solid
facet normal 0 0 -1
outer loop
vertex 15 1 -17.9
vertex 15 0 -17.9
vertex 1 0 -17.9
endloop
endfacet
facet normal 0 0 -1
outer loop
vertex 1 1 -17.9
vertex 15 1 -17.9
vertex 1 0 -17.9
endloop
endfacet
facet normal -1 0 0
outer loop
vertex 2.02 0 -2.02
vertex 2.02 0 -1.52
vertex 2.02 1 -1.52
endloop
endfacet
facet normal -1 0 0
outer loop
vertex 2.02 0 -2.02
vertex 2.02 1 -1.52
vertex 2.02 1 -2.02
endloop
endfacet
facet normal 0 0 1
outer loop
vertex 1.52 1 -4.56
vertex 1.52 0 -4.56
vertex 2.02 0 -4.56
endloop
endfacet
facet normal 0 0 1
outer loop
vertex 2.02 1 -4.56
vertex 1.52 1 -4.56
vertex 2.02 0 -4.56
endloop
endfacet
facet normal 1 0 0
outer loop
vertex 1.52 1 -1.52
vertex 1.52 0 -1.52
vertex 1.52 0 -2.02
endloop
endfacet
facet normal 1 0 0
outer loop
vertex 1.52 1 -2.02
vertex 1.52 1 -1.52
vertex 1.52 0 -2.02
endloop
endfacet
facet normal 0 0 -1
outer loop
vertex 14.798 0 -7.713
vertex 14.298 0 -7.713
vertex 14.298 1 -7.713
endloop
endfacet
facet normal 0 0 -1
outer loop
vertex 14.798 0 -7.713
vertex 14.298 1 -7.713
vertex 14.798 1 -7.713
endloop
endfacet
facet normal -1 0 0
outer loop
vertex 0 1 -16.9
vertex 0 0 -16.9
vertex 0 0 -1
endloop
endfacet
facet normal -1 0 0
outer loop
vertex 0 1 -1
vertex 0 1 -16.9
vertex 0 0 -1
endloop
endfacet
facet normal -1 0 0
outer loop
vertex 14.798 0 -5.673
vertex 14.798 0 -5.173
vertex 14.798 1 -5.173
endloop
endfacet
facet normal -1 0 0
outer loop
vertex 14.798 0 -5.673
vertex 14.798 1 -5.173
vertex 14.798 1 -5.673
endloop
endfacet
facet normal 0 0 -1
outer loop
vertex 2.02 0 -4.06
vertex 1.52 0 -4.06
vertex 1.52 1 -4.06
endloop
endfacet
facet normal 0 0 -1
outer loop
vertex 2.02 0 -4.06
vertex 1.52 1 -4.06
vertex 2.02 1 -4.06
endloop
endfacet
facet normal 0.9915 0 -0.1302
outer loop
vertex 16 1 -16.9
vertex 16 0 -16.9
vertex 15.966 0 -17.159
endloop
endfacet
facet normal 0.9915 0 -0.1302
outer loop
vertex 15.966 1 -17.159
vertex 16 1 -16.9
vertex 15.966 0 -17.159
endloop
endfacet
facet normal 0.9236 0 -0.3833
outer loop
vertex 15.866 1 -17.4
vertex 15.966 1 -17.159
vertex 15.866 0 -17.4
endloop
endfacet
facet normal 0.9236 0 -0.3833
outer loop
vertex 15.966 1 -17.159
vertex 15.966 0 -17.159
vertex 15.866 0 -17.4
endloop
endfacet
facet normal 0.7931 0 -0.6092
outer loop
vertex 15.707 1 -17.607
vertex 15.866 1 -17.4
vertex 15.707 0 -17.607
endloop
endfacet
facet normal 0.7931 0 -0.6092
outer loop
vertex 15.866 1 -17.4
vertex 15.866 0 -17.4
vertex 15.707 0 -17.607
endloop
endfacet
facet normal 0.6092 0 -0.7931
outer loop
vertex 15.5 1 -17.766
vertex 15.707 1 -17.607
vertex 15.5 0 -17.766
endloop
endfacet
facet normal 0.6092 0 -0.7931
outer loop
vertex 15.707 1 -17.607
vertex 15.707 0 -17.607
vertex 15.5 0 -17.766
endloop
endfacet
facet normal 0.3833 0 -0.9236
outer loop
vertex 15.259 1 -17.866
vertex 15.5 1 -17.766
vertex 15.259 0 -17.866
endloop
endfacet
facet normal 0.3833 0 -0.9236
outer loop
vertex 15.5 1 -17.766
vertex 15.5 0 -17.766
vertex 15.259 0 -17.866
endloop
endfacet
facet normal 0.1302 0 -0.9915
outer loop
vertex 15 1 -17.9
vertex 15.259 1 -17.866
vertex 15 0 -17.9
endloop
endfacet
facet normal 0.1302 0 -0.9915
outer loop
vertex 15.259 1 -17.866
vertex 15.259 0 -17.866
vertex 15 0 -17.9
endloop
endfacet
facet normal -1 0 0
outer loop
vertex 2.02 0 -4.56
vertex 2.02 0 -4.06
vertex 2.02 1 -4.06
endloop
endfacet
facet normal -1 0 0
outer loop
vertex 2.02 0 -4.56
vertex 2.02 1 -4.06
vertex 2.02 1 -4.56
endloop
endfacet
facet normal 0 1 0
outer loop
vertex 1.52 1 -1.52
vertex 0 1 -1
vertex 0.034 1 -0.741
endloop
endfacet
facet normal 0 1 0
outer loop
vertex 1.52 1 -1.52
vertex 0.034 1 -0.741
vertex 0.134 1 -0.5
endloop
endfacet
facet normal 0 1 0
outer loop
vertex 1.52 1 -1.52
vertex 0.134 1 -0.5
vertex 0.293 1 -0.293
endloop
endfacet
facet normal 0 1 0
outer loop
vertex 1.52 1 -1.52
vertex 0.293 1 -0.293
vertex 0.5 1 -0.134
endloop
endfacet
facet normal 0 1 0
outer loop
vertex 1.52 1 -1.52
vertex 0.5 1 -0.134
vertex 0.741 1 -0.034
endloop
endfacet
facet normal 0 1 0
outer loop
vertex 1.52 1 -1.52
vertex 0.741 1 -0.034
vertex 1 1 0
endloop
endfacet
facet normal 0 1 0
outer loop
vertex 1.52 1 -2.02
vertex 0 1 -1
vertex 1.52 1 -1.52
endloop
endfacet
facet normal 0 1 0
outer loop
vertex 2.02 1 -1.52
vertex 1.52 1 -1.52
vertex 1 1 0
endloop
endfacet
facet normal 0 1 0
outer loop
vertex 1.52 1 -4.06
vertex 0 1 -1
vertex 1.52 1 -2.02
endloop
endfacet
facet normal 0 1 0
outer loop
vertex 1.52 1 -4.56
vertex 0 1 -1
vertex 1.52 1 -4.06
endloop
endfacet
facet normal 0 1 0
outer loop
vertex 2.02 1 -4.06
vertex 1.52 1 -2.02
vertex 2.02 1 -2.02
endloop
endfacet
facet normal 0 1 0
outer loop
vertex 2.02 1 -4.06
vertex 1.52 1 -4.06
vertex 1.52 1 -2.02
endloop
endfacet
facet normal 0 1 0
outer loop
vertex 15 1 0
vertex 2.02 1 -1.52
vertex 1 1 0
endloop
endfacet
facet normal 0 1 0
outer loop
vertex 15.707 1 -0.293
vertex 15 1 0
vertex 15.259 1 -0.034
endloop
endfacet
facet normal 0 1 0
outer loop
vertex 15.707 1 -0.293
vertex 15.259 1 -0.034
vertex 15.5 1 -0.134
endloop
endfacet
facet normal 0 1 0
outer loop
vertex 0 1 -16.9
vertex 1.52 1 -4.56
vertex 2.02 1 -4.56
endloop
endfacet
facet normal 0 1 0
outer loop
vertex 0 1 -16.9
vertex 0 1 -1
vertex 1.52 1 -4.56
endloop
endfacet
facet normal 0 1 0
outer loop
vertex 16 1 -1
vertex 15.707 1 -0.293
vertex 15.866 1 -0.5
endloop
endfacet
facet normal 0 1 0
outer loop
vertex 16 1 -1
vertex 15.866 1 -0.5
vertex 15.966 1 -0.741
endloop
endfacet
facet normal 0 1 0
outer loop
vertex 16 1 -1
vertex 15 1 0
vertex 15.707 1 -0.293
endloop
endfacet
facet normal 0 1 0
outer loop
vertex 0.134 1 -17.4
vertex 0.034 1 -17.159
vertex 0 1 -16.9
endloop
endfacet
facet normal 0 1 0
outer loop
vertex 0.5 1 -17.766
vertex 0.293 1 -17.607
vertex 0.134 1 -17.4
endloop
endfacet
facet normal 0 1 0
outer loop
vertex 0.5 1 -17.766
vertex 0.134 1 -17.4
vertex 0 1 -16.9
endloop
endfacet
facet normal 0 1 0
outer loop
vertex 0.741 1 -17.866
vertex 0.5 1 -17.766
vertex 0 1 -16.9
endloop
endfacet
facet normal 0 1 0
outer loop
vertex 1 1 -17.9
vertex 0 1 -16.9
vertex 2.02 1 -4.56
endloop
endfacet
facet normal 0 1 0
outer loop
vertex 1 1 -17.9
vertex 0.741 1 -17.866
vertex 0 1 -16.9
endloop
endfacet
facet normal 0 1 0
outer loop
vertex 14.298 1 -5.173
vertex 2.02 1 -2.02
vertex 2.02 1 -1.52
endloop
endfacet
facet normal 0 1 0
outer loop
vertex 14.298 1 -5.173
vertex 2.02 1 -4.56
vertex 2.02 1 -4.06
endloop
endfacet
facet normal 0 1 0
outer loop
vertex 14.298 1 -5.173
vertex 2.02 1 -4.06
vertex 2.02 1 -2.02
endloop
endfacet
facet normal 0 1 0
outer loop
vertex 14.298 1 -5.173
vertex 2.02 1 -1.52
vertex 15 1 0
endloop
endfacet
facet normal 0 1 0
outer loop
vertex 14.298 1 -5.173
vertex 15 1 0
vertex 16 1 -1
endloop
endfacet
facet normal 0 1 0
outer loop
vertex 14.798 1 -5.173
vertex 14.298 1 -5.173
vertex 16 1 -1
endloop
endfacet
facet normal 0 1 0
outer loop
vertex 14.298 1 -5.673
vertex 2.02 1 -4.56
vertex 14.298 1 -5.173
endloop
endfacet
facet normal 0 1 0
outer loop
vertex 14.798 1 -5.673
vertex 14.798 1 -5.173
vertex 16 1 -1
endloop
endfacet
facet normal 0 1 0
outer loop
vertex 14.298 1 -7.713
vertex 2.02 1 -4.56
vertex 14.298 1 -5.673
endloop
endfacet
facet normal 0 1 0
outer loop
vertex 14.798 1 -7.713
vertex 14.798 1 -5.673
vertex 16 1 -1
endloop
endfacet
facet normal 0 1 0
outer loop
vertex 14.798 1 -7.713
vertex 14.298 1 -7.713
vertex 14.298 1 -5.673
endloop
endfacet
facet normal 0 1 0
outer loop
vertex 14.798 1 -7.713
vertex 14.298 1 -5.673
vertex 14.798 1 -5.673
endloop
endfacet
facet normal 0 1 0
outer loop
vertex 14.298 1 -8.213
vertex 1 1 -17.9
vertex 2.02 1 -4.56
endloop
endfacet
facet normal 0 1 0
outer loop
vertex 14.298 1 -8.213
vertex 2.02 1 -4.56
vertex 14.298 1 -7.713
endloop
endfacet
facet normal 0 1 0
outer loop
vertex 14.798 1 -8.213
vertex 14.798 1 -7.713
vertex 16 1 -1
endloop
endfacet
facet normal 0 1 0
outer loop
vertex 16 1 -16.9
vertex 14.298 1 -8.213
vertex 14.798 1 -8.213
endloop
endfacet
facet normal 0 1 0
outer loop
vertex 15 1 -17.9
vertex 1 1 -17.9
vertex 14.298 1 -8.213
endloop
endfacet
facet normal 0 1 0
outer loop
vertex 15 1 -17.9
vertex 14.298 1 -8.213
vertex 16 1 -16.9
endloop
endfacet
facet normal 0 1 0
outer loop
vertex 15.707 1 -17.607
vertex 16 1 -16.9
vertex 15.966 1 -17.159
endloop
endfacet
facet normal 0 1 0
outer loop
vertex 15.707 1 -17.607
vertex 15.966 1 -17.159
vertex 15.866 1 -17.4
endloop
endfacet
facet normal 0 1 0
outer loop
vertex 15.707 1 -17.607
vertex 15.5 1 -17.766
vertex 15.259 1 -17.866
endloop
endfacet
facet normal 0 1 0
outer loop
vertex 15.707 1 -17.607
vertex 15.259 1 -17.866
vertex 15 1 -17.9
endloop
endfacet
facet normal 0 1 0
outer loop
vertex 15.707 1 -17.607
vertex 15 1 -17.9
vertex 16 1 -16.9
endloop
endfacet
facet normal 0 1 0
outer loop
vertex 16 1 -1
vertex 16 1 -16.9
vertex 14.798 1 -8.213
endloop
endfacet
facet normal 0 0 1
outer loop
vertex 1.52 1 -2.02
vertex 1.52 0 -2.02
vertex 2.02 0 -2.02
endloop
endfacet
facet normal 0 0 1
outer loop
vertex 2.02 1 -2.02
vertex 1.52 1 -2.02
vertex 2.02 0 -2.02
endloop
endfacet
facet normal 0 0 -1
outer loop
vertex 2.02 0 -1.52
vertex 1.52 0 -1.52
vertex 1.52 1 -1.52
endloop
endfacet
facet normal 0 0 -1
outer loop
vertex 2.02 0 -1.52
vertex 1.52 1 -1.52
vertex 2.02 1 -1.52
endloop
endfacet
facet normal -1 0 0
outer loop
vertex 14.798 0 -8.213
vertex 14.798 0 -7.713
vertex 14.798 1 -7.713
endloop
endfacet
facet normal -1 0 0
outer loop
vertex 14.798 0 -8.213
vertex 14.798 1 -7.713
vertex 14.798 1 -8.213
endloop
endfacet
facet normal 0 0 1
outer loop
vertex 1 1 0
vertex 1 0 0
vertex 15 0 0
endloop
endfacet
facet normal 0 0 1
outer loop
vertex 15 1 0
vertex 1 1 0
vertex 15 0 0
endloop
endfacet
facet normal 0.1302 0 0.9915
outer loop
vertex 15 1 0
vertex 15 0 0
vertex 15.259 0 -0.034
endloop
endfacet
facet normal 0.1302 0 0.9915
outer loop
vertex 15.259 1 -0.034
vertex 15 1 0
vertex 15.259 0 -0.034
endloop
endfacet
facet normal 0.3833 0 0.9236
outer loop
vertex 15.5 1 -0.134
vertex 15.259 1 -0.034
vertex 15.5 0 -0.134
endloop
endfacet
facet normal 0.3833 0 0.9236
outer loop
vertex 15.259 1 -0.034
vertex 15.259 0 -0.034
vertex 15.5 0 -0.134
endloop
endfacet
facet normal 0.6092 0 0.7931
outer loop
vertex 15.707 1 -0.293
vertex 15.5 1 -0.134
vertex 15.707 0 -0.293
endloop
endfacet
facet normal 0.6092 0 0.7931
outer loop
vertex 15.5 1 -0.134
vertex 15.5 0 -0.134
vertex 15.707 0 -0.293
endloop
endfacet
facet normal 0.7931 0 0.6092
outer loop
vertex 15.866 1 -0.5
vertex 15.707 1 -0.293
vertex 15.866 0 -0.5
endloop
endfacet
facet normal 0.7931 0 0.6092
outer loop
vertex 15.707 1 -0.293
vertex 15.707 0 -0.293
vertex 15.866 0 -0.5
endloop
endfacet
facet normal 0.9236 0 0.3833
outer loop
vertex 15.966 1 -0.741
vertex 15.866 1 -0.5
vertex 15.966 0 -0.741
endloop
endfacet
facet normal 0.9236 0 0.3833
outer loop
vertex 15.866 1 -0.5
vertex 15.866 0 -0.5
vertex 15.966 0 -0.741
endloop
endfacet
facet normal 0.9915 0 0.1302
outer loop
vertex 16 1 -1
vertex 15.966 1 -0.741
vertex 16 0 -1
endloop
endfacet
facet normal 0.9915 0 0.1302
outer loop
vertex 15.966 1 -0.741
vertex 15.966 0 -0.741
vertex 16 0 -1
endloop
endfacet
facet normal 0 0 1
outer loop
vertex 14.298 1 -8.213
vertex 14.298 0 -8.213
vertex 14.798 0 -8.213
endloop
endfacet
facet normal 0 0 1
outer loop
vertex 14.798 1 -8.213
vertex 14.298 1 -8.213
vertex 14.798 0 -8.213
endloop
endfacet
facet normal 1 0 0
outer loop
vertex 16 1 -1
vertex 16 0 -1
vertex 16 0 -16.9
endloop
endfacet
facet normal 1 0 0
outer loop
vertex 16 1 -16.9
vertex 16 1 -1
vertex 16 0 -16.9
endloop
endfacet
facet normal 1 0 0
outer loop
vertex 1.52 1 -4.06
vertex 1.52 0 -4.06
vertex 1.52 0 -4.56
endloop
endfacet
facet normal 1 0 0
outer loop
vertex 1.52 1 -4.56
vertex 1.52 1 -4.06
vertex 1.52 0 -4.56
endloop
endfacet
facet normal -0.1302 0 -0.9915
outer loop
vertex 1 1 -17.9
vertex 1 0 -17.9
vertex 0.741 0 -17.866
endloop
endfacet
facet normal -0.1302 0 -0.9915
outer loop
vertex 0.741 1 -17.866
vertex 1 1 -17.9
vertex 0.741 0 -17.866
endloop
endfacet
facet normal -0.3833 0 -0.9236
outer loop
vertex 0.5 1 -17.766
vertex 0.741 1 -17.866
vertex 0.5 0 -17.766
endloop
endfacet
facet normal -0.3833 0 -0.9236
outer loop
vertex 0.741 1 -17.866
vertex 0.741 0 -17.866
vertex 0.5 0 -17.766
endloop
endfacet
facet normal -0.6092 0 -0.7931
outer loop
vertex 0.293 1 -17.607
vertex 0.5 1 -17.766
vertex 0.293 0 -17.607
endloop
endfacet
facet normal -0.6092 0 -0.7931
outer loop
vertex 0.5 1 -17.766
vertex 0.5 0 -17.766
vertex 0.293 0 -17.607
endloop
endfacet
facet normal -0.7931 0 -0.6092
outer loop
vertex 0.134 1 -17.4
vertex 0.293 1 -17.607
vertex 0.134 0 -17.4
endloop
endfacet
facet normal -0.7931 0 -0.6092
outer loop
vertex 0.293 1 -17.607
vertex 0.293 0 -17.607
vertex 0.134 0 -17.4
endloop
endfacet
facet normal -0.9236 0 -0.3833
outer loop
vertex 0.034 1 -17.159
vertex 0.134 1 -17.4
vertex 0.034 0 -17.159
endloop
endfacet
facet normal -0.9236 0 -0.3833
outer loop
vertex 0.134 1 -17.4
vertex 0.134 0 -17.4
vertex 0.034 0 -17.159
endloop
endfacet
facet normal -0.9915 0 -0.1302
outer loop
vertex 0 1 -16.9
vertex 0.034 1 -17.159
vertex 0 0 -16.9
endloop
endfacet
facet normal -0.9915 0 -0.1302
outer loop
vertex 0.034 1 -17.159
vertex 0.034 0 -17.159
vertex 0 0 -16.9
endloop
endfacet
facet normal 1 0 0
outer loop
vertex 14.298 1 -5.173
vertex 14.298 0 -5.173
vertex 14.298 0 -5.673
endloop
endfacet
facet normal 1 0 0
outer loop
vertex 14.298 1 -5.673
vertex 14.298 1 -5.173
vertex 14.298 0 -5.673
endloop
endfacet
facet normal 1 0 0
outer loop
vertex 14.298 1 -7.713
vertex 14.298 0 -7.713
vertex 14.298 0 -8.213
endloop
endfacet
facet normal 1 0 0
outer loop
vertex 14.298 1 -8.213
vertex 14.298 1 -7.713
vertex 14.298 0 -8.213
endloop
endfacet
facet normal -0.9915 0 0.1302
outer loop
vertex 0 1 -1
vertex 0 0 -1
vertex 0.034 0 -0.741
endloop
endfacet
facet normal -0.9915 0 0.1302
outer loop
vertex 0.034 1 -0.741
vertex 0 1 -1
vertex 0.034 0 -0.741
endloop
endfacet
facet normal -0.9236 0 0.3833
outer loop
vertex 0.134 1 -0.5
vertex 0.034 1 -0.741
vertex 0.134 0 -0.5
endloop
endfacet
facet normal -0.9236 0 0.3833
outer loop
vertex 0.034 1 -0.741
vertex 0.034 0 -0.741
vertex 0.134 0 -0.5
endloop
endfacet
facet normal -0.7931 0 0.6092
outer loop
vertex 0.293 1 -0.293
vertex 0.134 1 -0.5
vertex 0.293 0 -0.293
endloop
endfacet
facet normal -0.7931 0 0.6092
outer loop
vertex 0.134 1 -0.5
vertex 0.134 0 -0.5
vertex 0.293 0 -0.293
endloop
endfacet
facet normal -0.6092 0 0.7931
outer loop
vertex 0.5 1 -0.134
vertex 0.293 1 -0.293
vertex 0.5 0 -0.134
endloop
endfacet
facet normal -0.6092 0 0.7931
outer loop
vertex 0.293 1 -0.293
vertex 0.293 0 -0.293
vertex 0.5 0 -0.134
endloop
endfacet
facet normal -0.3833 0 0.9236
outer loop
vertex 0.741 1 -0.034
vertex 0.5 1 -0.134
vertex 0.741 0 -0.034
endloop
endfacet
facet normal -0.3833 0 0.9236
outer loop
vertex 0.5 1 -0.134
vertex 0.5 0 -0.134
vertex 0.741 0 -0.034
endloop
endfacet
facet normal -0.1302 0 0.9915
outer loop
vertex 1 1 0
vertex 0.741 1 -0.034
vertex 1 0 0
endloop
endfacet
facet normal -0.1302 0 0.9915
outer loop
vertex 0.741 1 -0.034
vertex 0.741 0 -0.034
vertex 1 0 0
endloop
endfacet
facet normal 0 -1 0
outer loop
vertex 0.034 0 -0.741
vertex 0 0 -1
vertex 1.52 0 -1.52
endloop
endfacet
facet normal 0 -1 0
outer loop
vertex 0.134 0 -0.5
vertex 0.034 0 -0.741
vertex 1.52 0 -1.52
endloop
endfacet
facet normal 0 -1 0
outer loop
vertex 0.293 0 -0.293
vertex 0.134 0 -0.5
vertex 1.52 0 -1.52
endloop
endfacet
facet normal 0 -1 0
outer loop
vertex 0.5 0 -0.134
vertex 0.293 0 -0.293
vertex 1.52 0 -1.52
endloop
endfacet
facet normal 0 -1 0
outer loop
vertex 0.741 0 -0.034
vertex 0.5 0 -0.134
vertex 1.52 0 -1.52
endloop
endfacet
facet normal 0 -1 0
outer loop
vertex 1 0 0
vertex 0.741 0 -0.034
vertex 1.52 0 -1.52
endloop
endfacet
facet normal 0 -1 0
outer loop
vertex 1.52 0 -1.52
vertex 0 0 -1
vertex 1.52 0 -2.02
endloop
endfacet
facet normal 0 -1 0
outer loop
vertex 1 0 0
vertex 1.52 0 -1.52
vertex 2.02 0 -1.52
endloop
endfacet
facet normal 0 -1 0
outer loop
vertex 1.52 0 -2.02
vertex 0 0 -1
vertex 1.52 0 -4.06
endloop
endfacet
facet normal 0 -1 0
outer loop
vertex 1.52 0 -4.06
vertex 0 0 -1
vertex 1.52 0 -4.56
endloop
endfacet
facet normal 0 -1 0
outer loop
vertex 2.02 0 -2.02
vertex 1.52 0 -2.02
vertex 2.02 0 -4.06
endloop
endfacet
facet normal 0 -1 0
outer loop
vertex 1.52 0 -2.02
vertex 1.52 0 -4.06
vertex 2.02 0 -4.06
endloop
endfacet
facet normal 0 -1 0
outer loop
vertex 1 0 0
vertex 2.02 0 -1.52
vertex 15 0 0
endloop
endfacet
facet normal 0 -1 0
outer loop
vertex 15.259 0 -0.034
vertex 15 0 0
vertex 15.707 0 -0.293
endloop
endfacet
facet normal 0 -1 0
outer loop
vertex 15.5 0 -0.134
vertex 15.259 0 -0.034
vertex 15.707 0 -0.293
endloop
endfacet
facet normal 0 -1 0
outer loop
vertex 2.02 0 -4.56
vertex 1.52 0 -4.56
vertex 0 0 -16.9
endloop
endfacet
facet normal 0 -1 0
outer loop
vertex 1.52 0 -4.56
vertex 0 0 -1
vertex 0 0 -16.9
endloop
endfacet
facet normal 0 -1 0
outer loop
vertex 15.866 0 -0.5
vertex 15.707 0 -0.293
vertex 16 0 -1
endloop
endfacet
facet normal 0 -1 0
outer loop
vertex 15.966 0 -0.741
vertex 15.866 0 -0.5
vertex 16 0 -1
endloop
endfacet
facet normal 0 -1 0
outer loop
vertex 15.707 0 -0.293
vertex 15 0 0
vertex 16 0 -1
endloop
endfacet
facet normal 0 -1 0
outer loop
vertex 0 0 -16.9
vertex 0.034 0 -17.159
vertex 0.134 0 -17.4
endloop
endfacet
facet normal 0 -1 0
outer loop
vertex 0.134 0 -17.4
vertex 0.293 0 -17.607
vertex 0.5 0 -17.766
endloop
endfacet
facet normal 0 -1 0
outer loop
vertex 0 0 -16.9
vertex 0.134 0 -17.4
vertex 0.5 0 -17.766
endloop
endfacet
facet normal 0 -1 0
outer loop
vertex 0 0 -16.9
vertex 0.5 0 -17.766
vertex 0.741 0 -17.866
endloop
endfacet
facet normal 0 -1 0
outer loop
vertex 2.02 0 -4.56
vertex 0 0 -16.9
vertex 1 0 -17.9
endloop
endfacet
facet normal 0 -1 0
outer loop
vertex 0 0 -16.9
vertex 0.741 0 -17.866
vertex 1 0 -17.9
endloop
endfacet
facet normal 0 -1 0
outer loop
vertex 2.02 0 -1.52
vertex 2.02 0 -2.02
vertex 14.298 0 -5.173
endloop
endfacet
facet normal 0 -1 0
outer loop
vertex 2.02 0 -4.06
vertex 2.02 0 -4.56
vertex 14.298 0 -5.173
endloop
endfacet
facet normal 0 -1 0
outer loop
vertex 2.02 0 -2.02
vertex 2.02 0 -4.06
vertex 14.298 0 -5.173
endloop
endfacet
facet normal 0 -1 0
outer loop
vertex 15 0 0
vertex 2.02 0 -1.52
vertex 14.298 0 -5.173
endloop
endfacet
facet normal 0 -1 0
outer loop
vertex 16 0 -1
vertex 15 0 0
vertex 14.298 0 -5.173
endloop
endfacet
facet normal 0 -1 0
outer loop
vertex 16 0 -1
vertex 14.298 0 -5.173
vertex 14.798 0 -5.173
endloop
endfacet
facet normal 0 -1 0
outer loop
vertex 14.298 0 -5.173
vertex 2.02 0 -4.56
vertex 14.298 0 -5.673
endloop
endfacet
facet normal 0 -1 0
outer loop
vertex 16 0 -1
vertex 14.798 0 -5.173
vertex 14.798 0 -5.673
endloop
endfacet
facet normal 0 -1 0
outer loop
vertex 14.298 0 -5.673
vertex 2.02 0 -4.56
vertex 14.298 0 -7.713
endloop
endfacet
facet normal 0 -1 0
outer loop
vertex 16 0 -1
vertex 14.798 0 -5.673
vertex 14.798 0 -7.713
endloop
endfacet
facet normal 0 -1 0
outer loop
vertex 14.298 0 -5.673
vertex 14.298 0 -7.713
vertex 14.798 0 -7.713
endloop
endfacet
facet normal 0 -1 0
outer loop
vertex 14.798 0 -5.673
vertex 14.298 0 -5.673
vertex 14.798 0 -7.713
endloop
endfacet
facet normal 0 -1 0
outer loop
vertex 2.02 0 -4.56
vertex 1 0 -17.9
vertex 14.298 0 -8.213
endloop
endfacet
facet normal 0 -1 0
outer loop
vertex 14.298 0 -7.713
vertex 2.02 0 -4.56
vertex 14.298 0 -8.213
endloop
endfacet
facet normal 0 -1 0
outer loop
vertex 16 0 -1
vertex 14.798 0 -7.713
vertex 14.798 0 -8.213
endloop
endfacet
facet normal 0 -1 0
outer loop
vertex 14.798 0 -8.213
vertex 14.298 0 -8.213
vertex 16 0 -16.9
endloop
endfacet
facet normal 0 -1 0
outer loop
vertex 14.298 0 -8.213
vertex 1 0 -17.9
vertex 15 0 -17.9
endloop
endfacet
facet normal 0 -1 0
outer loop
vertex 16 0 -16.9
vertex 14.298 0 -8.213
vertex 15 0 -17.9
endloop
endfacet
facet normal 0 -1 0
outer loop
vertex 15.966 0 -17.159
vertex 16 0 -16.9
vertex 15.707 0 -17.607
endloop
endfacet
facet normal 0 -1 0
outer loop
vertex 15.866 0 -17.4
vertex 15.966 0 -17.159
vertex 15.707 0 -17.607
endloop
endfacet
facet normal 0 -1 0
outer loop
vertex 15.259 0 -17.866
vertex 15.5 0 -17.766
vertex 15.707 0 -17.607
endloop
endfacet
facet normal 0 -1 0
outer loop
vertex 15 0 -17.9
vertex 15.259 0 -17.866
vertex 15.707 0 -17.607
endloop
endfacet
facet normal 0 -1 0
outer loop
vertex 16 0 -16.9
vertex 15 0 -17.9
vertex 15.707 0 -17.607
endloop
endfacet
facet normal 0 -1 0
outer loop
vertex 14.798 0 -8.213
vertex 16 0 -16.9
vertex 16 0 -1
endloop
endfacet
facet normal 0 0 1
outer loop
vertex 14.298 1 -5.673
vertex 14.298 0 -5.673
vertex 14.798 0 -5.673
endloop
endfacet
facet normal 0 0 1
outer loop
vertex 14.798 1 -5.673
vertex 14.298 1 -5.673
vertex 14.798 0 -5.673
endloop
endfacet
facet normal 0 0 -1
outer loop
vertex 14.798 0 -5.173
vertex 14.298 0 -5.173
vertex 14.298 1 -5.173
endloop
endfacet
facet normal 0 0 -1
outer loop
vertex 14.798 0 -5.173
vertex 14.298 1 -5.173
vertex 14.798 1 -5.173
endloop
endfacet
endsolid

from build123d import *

# Parameters (mm, degrees)
SKETCH1_W           = 0.5
SKETCH1_H           = 0.5
BOSS_EXTRUDE1_DEPTH = 1


with BuildPart() as part:
    # Sketch1 → Boss-Extrude1 (new body)
    with BuildSketch(Plane(origin=(0, 0, 0), x_dir=(1, 0, 0), z_dir=(0, 1, 0))):
        with BuildLine():
            Line((1, 0), (15, 0))
            ThreePointArc((15, 0), (15.707106781, 0.292893219), (16, 1))
            Line((16, 1), (16, 16.9))
            ThreePointArc((16, 16.9), (15.707106781, 17.607106781), (15, 17.9))
            Line((15, 17.9), (1, 17.9))
            ThreePointArc((1, 17.9), (0.292893219, 17.607106781), (0, 16.9))
            Line((0, 16.9), (0, 1))
            ThreePointArc((0, 1), (0.292893219, 0.292893219), (1, 0))
        make_face()
        with Locations((1.77, 1.77)):
            Rectangle(SKETCH1_W, SKETCH1_H, mode=Mode.SUBTRACT)
        with Locations((1.77, 4.31)):
            Rectangle(SKETCH1_W, SKETCH1_H, mode=Mode.SUBTRACT)
        with Locations((14.548, 7.963)):
            Rectangle(SKETCH1_W, SKETCH1_H, mode=Mode.SUBTRACT)
        with Locations((14.548, 5.423)):
            Rectangle(SKETCH1_W, SKETCH1_H, mode=Mode.SUBTRACT)
    extrude(amount=BOSS_EXTRUDE1_DEPTH)


solid = part.part
